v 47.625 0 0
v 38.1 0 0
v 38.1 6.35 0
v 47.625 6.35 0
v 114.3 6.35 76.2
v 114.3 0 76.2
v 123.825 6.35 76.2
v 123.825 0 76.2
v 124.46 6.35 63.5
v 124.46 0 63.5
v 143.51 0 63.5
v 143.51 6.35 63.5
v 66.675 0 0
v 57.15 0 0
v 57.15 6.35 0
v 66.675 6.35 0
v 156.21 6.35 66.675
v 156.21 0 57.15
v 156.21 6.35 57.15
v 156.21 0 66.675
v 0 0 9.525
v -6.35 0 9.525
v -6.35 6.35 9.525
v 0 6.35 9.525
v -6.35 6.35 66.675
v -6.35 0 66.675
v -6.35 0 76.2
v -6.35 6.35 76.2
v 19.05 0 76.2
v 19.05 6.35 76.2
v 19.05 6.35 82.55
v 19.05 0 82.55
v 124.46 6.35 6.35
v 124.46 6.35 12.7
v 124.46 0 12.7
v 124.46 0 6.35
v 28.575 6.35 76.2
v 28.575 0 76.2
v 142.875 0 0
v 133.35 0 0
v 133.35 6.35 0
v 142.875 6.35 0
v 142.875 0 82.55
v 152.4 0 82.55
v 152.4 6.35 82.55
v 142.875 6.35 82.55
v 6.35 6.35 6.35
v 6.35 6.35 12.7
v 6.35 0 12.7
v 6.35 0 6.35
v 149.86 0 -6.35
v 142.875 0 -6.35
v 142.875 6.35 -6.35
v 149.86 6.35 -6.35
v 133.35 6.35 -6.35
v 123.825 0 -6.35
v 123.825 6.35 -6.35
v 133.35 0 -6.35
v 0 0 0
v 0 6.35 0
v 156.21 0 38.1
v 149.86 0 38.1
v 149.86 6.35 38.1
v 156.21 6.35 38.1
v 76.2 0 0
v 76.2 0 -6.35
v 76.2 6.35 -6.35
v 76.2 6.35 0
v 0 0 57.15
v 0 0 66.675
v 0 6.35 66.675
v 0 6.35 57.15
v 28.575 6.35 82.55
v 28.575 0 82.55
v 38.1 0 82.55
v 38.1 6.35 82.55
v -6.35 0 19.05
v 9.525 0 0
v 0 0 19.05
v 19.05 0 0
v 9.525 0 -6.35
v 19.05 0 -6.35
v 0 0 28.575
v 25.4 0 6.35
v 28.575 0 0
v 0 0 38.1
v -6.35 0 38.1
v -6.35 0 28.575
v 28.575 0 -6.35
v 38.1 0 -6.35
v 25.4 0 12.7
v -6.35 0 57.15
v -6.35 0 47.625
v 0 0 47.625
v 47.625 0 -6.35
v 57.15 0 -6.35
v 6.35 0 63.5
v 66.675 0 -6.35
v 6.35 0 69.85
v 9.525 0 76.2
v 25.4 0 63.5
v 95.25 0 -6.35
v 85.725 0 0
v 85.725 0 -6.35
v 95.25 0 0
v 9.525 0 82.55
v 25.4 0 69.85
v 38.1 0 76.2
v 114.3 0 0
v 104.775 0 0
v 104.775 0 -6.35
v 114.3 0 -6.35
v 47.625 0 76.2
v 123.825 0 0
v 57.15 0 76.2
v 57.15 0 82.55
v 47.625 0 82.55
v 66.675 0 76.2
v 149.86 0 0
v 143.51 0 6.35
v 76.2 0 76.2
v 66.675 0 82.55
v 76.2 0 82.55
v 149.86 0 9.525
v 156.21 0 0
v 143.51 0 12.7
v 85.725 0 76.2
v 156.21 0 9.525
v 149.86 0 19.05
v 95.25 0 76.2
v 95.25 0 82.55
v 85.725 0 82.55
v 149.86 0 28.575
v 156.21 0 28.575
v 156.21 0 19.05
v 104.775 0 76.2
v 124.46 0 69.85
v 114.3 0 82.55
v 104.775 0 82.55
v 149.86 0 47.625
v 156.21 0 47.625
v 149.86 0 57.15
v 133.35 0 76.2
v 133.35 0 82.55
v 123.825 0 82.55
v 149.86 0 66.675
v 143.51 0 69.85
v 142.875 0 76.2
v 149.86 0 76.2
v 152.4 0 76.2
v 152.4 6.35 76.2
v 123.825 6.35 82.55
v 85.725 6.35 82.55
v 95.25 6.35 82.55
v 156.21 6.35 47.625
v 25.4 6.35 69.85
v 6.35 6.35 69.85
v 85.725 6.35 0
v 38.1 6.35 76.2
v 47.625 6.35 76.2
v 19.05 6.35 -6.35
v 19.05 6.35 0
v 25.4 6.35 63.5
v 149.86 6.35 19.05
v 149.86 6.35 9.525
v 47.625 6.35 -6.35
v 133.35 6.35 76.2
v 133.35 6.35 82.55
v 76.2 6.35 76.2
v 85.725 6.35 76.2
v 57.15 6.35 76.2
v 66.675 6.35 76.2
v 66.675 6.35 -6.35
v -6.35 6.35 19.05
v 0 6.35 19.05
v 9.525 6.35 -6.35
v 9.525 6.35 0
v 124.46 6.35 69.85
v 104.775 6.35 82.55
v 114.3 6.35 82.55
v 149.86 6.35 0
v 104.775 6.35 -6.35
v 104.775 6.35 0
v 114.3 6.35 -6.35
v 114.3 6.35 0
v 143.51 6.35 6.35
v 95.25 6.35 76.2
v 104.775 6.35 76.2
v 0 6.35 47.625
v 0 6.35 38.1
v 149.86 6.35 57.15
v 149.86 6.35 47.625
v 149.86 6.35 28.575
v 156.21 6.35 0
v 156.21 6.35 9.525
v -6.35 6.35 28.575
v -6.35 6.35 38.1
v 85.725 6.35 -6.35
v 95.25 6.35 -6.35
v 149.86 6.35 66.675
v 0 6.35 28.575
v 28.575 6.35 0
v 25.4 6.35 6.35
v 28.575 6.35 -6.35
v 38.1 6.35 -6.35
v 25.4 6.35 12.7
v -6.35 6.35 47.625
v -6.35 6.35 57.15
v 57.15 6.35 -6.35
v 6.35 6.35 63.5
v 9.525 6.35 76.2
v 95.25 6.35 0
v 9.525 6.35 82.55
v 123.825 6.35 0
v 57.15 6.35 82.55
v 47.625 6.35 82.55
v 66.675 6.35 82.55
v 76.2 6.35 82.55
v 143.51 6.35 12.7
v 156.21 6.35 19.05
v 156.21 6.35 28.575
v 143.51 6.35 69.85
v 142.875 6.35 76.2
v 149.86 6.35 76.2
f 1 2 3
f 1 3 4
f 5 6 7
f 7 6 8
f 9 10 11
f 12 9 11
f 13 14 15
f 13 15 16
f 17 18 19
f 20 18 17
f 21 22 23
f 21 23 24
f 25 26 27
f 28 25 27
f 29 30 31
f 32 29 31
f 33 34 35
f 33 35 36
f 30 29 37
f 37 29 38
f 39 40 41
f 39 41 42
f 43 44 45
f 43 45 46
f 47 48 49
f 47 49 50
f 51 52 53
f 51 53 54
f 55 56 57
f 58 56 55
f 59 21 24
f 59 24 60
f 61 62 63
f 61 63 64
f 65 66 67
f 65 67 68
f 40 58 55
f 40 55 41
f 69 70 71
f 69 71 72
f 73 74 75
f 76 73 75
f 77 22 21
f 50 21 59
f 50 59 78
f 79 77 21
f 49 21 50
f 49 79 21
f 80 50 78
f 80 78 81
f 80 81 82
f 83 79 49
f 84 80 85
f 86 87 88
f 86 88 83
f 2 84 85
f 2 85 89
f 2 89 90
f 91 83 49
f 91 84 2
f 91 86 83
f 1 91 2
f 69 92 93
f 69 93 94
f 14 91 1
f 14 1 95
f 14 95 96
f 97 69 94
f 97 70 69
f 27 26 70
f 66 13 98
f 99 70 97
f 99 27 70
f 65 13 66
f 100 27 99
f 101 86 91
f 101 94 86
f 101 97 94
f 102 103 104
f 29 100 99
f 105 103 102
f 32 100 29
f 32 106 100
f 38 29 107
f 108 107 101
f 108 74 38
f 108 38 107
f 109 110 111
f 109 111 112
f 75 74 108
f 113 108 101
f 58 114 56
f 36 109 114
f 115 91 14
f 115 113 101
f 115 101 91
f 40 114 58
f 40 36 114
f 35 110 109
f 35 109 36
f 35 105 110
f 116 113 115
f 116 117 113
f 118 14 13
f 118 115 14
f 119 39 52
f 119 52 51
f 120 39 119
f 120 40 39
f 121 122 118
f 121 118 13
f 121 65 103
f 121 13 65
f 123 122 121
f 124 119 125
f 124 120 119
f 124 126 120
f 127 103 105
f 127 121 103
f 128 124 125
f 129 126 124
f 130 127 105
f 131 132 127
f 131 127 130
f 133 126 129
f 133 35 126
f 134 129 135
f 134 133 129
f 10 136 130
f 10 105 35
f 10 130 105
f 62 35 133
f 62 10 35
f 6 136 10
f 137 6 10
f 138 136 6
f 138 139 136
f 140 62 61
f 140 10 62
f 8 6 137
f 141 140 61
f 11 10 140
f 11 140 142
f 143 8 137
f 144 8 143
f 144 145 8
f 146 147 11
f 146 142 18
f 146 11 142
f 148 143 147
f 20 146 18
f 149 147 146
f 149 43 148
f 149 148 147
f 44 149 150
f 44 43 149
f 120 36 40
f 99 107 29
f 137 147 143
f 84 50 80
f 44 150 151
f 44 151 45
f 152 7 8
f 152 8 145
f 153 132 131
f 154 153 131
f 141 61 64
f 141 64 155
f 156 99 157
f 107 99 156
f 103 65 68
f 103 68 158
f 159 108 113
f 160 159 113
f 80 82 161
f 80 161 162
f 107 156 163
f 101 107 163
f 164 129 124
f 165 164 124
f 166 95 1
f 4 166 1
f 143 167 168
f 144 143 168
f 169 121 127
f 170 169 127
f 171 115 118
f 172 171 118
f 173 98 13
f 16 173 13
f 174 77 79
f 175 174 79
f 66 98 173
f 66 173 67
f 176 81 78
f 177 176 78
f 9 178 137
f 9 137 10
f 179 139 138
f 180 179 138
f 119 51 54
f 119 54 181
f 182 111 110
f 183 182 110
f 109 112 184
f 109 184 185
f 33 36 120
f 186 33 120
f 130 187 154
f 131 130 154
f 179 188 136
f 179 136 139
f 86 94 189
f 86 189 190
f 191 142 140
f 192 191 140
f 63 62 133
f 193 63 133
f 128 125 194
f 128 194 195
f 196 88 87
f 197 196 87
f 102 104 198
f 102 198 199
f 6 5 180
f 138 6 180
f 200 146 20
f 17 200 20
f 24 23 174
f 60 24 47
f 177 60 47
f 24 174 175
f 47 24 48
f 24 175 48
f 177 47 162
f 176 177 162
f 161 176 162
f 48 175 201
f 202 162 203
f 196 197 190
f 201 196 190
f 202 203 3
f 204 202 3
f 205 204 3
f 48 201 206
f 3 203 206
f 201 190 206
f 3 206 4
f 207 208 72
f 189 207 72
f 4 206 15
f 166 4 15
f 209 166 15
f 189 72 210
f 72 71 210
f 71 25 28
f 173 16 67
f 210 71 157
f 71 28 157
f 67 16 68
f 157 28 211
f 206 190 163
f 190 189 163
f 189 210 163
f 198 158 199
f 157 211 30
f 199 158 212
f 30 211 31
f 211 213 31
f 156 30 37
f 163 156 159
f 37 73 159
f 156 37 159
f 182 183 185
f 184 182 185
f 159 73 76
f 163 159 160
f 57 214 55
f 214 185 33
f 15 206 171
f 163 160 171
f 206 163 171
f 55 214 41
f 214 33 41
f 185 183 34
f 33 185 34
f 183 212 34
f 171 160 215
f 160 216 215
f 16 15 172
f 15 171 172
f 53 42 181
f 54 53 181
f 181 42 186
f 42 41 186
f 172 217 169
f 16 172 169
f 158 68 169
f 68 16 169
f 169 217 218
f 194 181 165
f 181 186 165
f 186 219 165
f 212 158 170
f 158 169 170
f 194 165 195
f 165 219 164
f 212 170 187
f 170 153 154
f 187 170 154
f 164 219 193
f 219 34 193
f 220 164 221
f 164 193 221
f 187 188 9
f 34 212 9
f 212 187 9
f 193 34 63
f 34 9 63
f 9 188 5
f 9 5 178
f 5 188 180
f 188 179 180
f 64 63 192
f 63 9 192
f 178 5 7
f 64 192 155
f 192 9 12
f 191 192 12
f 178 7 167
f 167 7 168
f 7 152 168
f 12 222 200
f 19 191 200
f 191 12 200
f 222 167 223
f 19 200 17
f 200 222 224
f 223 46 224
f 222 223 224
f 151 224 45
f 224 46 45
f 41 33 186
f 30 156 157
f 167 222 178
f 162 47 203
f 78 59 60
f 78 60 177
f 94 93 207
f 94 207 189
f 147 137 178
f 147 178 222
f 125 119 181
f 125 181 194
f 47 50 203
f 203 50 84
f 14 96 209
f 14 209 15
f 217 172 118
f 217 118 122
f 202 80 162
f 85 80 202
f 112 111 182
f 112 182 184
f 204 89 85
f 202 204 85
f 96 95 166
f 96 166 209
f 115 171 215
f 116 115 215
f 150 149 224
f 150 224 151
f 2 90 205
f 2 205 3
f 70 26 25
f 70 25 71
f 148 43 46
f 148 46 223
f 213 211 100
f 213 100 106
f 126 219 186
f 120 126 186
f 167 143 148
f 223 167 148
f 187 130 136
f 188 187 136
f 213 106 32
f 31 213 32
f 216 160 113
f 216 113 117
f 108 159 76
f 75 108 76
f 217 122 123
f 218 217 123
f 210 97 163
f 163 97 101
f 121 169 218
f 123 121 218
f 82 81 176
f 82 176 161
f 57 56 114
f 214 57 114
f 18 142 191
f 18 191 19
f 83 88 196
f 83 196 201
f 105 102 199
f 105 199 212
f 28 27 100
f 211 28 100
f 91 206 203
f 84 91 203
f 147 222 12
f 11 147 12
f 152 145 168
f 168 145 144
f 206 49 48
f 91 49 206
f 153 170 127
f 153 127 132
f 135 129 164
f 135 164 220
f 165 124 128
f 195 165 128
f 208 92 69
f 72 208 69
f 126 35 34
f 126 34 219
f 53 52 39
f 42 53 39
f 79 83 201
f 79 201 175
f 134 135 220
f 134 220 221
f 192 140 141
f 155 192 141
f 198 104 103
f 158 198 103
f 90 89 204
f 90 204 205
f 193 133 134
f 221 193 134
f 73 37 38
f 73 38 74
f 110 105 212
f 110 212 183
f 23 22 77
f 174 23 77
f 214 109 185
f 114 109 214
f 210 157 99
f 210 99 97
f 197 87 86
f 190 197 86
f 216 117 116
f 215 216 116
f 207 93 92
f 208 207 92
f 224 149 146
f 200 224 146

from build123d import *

# Parameters (mm, degrees)
SKETCH1_W           = 149.86
SKETCH1_H           = 76.2
SKETCH1_W_2         = 19.05
SKETCH1_H_2         = 6.35
BOSS_EXTRUDE1_DEPTH = 6.35
SKETCH2_W           = 6.35
SKETCH2_H           = 9.525
SKETCH2_W_2         = 9.525
SKETCH2_H_2         = 6.35
SKETCH2_W_3         = 6.985
BOSS_EXTRUDE2_DEPTH = 6.35


with BuildPart() as part:
    # Sketch1 → Boss-Extrude1 (new body)
    with BuildSketch(Plane(origin=(0, 0, 0), x_dir=(1, 0, 0), z_dir=(0, 1, 0))):
        with Locations((74.93, -38.1)):
            Rectangle(SKETCH1_W, SKETCH1_H)
        with Locations((15.875, -66.675)):
            Rectangle(SKETCH1_W_2, SKETCH1_H_2, mode=Mode.SUBTRACT)
        with Locations((15.875, -9.525)):
            Rectangle(SKETCH1_W_2, SKETCH1_H_2, mode=Mode.SUBTRACT)
        with Locations((133.985, -66.675)):
            Rectangle(SKETCH1_W_2, SKETCH1_H_2, mode=Mode.SUBTRACT)
        with Locations((133.985, -9.525)):
            Rectangle(SKETCH1_W_2, SKETCH1_H_2, mode=Mode.SUBTRACT)
    extrude(amount=BOSS_EXTRUDE1_DEPTH)

    # Sketch2 → Boss-Extrude2 (add)
    with BuildSketch(Plane.XZ):
        with Locations((-3.175, 52.3875)):
            Rectangle(SKETCH2_W, SKETCH2_H)
        with Locations((-3.175, 33.3375)):
            Rectangle(SKETCH2_W, SKETCH2_H)
        with Locations((14.2875, -3.175)):
            Rectangle(SKETCH2_W_2, SKETCH2_H_2)
        with Locations((52.3875, -3.175)):
            Rectangle(SKETCH2_W_2, SKETCH2_H_2)
        with Locations((71.4375, -3.175)):
            Rectangle(SKETCH2_W_2, SKETCH2_H_2)
        with Locations((90.4875, -3.175)):
            Rectangle(SKETCH2_W_2, SKETCH2_H_2)
        with Locations((128.5875, -3.175)):
            Rectangle(SKETCH2_W_2, SKETCH2_H_2)
        with Locations((146.3675, -3.175)):
            Rectangle(SKETCH2_W_3, SKETCH2_H_2)
        with Locations((153.035, 42.8625)):
            Rectangle(SKETCH2_W, SKETCH2_H)
        Polygon((142.875, 82.55), (142.875, 76.2), (149.86, 76.2), (152.4, 76.2), (152.4, 82.55), align=None)
        with Locations((109.5375, 79.375)):
            Rectangle(SKETCH2_W_2, SKETCH2_H_2)
        with Locations((90.4875, 79.375)):
            Rectangle(SKETCH2_W_2, SKETCH2_H_2)
        with Locations((33.3375, 79.375)):
            Rectangle(SKETCH2_W_2, SKETCH2_H_2)
        with Locations((14.2875, 79.375)):
            Rectangle(SKETCH2_W_2, SKETCH2_H_2)
        with Locations((128.5875, 79.375)):
            Rectangle(SKETCH2_W_2, SKETCH2_H_2)
        with Locations((-3.175, 71.4375)):
            Rectangle(SKETCH2_W, SKETCH2_H)
        with Locations((-3.175, 14.2875)):
            Rectangle(SKETCH2_W, SKETCH2_H)
        with Locations((33.3375, -3.175)):
            Rectangle(SKETCH2_W_2, SKETCH2_H_2)
        with Locations((109.5375, -3.175)):
            Rectangle(SKETCH2_W_2, SKETCH2_H_2)
        with Locations((153.035, 4.7625)):
            Rectangle(SKETCH2_W, SKETCH2_H)
        with Locations((153.035, 23.8125)):
            Rectangle(SKETCH2_W, SKETCH2_H)
        with Locations((153.035, 61.9125)):
            Rectangle(SKETCH2_W, SKETCH2_H)
        with Locations((71.4375, 79.375)):
            Rectangle(SKETCH2_W_2, SKETCH2_H_2)
        with Locations((52.3875, 79.375)):
            Rectangle(SKETCH2_W_2, SKETCH2_H_2)
    extrude(amount=-BOSS_EXTRUDE2_DEPTH)


solid = part.part
